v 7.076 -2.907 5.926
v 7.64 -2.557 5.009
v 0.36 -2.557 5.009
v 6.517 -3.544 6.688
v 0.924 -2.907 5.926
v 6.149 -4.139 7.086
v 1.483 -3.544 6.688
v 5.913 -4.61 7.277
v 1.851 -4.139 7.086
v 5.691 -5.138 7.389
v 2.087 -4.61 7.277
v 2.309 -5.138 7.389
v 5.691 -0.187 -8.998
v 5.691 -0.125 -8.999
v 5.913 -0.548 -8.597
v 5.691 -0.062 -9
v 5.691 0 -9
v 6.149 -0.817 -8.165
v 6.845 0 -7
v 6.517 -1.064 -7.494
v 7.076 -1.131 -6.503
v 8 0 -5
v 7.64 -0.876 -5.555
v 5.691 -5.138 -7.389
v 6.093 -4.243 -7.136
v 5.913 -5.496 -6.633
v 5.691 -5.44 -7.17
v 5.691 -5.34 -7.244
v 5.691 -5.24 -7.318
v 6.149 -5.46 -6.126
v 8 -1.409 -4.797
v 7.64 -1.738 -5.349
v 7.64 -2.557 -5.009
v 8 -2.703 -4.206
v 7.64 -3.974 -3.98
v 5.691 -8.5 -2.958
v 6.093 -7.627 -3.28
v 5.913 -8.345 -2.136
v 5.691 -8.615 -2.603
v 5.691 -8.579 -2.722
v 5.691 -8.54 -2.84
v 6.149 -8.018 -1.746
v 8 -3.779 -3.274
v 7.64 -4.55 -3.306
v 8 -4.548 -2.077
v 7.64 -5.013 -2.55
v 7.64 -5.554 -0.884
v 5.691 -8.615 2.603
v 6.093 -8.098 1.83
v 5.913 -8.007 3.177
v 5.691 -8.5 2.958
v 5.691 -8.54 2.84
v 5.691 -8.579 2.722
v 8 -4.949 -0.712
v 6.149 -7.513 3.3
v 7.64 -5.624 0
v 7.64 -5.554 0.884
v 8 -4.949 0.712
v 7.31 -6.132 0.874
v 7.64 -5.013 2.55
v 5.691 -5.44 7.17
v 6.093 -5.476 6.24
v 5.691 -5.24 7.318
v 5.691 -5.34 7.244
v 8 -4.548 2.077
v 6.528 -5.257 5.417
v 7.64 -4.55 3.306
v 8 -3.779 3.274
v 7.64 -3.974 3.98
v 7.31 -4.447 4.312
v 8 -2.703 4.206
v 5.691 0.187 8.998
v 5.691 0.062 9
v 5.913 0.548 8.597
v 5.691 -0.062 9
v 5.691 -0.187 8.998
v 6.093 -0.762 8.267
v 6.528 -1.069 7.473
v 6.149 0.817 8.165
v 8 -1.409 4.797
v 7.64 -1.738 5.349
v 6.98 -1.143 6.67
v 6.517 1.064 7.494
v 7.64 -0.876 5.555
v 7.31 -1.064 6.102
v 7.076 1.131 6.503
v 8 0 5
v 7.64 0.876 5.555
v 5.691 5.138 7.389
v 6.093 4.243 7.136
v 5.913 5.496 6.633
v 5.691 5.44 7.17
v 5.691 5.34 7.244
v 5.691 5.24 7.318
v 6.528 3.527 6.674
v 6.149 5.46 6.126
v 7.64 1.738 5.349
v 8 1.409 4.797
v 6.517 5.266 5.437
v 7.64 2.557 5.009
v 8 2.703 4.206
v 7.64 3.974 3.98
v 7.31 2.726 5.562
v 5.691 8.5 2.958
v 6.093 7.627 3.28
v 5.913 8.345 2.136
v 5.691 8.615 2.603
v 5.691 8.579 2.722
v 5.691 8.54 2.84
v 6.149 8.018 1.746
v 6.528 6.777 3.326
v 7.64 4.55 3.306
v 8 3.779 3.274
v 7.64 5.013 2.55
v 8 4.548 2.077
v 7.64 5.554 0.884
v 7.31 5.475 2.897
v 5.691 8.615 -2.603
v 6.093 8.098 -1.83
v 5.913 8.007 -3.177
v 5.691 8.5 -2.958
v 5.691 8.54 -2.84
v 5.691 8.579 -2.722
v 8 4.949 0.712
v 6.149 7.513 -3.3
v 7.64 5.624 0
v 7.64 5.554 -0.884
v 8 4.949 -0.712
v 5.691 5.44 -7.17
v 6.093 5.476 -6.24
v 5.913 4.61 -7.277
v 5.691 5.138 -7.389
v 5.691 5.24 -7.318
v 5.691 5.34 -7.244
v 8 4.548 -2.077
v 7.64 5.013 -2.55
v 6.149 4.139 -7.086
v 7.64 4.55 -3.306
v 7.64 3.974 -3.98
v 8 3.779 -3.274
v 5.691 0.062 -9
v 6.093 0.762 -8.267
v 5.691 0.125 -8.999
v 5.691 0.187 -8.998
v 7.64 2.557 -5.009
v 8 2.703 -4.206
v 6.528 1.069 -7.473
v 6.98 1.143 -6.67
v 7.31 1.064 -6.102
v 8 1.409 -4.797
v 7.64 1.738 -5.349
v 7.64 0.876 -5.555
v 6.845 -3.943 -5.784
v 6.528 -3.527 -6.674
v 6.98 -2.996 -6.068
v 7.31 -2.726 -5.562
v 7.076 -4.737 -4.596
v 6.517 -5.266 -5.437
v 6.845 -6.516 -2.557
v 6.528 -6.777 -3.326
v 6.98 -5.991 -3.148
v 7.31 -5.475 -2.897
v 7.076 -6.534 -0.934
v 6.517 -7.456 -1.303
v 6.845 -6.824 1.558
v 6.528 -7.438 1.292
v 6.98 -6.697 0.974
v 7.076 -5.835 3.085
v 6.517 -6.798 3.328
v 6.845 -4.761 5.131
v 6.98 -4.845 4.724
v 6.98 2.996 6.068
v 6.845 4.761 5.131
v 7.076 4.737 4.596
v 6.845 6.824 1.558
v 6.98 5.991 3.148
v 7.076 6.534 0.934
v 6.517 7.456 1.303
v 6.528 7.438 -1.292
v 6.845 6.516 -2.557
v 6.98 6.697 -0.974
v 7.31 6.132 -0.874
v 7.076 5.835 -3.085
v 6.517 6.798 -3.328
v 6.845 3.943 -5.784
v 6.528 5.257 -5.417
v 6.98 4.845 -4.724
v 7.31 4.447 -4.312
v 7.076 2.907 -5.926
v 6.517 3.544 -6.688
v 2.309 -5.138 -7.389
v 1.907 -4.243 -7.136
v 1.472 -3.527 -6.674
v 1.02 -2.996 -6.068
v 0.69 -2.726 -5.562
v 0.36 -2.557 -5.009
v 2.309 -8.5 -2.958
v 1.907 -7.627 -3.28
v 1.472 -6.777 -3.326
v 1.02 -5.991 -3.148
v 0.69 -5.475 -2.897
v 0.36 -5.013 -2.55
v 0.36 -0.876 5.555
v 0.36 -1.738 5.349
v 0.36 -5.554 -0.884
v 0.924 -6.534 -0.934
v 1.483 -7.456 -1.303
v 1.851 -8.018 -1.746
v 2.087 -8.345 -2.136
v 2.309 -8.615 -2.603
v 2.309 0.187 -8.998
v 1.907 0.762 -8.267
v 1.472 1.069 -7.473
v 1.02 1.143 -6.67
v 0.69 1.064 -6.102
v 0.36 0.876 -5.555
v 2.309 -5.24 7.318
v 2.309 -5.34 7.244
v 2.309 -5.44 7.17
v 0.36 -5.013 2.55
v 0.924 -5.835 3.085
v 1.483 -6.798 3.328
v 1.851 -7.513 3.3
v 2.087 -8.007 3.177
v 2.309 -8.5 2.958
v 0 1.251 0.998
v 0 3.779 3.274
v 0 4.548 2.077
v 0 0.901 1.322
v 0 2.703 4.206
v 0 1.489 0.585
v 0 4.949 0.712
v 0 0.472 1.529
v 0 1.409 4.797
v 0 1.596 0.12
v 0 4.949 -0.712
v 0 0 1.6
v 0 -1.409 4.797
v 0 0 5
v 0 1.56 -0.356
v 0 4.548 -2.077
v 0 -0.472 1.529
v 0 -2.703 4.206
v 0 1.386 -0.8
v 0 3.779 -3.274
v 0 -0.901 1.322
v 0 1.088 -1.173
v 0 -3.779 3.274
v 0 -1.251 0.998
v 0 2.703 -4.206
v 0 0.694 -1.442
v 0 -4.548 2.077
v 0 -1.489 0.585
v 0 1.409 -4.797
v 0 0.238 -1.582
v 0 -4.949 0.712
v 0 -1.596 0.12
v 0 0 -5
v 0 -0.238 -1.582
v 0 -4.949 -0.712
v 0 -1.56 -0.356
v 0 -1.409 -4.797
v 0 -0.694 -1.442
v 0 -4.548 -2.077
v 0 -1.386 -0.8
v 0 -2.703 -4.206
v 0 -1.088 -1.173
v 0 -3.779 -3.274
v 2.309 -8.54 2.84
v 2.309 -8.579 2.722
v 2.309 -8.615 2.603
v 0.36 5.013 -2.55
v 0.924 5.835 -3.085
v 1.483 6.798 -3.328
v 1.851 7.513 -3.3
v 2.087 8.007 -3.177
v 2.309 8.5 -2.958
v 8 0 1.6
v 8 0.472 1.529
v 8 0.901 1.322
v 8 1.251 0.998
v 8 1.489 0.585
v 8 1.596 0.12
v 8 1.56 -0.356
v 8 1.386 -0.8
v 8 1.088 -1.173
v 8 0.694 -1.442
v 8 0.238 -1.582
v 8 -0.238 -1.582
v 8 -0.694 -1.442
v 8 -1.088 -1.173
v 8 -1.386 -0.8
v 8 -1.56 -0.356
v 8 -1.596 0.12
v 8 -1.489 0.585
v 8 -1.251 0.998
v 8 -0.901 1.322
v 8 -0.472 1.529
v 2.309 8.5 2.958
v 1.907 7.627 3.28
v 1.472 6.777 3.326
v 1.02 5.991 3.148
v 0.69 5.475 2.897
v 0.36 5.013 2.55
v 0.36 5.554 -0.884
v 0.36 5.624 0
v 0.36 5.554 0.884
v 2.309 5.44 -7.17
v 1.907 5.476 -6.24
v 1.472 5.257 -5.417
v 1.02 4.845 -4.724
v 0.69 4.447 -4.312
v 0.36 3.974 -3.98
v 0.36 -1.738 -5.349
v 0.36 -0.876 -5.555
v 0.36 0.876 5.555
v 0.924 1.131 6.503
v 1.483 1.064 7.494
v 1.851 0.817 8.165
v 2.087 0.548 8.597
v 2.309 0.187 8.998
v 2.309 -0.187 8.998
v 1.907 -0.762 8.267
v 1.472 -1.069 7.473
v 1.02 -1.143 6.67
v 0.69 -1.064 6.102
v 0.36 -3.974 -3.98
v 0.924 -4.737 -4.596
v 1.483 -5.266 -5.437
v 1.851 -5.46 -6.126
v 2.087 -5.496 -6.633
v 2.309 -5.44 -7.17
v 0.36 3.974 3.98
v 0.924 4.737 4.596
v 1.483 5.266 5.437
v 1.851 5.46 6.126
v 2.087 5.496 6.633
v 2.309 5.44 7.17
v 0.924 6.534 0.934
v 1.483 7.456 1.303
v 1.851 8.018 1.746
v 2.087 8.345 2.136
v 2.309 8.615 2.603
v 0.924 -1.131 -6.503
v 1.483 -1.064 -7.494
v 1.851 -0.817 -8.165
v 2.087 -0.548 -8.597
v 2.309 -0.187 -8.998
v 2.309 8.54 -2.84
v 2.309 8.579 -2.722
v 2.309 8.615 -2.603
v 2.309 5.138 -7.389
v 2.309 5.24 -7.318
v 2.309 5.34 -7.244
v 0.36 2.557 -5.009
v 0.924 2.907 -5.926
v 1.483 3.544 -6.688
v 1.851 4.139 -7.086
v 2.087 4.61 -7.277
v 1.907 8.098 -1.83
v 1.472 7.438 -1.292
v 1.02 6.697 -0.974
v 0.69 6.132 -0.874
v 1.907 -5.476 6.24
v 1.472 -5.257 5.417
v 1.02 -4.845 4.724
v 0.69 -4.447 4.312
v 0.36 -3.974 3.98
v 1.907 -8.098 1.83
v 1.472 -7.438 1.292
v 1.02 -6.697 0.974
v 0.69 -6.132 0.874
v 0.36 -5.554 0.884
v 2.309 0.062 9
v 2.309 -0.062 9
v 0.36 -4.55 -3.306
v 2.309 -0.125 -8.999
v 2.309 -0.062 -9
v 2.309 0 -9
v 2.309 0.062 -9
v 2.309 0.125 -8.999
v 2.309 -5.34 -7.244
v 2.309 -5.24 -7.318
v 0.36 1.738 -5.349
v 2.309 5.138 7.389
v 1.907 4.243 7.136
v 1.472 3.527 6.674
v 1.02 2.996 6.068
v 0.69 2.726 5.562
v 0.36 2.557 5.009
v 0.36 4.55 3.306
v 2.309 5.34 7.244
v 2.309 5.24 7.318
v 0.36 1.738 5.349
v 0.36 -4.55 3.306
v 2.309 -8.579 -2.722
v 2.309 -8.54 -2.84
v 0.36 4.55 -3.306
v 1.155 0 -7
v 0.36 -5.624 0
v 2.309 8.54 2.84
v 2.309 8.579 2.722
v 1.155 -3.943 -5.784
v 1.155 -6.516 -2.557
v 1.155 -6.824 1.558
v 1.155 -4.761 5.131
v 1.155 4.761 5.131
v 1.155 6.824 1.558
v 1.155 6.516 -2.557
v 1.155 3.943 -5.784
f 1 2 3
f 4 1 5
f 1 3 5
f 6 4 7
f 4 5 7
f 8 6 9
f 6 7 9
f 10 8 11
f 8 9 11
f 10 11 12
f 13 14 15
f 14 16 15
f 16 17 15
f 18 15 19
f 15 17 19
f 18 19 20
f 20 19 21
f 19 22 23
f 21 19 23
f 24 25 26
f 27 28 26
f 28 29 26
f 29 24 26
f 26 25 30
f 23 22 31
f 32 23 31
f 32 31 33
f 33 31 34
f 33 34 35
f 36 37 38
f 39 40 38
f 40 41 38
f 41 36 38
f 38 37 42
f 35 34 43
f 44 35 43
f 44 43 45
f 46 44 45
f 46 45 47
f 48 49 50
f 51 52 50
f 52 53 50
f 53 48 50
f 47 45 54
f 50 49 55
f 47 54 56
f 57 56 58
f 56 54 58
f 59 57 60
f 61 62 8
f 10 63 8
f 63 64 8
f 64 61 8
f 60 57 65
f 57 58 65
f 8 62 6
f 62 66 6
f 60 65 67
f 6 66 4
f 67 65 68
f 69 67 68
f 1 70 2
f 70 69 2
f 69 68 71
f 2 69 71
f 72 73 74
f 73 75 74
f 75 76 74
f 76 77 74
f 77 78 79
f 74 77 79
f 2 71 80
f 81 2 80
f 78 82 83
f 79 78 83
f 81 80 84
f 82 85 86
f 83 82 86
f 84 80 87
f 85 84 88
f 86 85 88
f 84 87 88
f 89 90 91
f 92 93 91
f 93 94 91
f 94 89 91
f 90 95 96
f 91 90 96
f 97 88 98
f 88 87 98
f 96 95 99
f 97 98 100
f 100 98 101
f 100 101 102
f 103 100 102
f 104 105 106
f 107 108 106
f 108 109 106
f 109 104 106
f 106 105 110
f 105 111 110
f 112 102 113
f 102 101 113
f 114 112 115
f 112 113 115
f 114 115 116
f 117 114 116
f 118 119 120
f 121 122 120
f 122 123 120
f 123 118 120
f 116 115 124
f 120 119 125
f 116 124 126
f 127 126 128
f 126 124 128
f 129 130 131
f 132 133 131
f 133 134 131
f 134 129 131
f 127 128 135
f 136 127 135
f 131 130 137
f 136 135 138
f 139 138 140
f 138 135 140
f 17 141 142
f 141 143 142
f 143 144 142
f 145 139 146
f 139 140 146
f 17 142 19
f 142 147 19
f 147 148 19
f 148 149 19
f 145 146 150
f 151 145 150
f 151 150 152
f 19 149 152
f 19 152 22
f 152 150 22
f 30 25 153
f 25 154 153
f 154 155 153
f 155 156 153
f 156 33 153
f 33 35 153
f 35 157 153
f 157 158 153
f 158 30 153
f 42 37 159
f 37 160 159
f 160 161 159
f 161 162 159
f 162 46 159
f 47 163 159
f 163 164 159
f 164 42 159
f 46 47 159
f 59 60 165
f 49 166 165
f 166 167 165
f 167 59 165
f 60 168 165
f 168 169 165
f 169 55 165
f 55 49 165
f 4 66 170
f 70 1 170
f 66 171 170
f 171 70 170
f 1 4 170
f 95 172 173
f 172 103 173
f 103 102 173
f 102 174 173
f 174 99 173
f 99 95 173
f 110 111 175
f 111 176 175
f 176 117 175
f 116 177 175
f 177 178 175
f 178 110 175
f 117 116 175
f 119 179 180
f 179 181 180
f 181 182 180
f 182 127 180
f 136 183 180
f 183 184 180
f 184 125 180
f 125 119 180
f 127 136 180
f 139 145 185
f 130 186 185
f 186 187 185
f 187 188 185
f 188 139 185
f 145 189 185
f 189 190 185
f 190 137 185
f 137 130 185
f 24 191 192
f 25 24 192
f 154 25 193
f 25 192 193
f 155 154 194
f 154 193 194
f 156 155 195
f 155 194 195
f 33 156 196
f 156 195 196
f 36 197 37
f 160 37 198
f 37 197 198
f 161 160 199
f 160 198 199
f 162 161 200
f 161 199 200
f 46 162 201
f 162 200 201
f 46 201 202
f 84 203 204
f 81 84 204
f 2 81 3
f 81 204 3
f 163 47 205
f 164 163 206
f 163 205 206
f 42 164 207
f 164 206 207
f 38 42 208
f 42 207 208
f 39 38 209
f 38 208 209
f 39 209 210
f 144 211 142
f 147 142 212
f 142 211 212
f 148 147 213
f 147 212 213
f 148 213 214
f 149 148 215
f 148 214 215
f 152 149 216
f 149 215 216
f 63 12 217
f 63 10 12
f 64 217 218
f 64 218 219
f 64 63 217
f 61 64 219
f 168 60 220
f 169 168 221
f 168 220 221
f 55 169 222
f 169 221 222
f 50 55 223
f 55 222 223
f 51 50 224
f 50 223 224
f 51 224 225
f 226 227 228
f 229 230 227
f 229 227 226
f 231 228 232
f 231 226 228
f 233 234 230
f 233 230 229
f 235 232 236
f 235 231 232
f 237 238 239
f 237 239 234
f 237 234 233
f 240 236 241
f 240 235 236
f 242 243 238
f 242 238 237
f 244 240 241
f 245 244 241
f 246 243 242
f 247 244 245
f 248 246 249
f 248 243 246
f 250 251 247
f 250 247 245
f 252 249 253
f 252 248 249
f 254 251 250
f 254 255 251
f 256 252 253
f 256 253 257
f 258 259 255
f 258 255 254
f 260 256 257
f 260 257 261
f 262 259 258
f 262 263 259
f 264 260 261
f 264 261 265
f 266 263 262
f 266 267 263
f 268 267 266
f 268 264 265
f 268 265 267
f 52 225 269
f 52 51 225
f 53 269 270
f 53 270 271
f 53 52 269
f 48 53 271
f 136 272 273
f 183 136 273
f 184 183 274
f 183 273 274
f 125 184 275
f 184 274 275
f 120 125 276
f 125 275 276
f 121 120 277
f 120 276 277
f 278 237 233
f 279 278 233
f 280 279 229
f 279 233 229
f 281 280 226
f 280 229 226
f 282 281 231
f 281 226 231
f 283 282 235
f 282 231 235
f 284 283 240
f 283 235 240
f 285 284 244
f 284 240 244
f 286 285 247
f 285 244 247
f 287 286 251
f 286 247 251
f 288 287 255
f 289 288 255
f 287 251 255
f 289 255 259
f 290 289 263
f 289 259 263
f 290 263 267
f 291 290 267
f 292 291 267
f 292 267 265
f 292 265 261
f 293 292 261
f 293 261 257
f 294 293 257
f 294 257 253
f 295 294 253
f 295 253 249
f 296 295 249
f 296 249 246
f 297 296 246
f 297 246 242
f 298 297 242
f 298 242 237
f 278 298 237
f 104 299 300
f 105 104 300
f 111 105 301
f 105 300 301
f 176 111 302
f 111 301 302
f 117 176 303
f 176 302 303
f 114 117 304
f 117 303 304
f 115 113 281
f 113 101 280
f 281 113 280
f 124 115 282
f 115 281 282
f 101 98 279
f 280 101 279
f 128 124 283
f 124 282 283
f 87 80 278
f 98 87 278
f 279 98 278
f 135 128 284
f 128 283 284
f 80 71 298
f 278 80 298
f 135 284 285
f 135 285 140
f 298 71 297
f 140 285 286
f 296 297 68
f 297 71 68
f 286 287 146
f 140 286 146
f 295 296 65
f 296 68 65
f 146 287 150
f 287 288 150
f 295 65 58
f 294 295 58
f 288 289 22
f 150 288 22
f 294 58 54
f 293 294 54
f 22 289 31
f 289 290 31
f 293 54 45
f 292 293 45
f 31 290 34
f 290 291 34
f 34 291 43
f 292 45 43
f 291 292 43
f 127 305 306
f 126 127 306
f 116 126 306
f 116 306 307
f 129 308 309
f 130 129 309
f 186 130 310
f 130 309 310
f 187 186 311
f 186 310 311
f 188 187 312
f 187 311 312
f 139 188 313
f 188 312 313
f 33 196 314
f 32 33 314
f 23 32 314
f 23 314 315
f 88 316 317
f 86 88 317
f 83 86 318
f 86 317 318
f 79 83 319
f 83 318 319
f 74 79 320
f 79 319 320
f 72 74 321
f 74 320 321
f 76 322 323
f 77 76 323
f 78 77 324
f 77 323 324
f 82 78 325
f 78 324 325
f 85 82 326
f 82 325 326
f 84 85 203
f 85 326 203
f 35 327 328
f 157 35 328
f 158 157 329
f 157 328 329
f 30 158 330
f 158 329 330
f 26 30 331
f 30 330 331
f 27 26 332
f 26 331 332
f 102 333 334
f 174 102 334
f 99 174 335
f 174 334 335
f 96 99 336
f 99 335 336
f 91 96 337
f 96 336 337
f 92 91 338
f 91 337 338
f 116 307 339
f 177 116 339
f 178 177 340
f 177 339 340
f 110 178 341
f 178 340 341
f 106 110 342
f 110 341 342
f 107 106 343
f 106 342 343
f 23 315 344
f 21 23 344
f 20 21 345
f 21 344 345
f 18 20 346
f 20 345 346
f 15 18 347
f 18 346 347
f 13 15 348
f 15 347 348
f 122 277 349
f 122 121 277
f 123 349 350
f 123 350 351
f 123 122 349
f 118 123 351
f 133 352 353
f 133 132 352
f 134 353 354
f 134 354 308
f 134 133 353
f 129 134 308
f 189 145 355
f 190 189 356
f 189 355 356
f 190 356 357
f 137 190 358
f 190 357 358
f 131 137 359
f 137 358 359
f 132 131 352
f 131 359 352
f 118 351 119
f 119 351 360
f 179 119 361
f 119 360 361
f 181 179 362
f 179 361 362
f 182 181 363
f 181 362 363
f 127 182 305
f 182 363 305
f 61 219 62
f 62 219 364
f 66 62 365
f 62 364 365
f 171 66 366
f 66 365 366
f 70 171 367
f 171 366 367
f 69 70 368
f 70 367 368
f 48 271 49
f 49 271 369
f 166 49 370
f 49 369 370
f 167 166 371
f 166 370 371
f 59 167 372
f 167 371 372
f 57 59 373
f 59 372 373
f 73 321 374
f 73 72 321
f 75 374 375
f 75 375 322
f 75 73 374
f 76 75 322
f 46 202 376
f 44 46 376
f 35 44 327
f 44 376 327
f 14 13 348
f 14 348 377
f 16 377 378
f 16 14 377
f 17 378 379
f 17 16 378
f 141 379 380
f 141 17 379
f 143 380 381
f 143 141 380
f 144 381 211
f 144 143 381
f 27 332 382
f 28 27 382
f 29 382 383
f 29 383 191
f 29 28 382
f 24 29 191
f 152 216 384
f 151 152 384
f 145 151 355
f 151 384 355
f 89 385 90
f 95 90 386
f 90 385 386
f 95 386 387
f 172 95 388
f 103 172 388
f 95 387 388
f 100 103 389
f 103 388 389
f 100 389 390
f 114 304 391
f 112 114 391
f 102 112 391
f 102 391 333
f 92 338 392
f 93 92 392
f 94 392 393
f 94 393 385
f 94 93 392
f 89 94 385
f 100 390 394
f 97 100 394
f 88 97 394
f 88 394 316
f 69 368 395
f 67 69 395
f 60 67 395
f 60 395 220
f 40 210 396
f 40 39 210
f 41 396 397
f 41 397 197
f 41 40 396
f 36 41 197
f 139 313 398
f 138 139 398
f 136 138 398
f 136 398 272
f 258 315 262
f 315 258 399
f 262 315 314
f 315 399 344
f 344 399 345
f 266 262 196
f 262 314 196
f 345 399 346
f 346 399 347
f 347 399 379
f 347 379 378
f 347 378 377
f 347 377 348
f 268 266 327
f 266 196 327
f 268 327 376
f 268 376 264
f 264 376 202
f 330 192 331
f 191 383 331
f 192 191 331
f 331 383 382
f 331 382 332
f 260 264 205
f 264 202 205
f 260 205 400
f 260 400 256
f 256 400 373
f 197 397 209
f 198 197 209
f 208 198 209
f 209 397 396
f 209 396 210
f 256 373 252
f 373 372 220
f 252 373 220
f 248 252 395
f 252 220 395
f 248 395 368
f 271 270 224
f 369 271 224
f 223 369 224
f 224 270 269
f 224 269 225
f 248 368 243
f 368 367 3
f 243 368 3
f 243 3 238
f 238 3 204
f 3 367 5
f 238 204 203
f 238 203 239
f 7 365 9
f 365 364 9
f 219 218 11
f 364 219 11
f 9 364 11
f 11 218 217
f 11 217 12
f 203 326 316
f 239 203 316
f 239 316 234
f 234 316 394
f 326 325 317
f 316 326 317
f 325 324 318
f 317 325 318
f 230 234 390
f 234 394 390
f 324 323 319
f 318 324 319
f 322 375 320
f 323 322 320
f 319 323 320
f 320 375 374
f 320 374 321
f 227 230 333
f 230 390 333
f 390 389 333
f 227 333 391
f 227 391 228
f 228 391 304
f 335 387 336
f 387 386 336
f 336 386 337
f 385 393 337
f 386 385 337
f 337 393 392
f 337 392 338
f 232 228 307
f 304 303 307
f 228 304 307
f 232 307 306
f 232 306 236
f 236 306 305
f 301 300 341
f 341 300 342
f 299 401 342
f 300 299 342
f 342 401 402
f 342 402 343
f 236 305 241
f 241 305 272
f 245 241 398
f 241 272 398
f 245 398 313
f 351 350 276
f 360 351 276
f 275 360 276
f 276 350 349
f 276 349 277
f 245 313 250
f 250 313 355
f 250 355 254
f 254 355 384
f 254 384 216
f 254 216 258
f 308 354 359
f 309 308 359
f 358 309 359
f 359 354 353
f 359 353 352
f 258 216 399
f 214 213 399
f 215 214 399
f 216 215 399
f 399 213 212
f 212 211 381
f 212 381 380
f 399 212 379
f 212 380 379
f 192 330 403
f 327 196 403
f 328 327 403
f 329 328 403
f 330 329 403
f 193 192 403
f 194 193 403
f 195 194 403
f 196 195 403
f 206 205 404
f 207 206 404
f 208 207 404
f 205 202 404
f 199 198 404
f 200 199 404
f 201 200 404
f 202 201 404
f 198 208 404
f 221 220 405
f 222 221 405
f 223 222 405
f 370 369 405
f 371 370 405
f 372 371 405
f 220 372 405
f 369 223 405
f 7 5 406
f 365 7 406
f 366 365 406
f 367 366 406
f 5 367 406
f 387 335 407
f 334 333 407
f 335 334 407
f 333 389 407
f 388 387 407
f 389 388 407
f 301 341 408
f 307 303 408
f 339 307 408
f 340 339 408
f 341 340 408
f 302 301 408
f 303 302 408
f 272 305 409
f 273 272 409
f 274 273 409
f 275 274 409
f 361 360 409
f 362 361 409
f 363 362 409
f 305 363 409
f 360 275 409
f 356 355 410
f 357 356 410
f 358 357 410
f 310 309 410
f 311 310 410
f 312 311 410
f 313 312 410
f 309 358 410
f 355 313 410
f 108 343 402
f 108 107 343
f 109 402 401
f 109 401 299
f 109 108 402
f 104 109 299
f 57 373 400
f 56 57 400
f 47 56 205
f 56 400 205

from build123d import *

# Parameters (mm, degrees)
BASPROSKE_W        = 8
BASPROSKE_H        = 9
TOOTHCUT_DEPTH     = 16.033296378
TEETHCUTS_COUNT    = 10
TEETHCUTS_ANGLE    = 324
BORSKE_R           = 1.5
BORE_DEPTH         = 50.0000508
SKETCH2_R          = 1.6
CUT_EXTRUDE1_DEPTH = 10


with BuildPart() as part:
    # BasProSke → Base-Revolve (revolve)
    with BuildSketch(Plane(origin=(0, 0, 0), x_dir=(1, 0, 0), z_dir=(0, 1, 0)), mode=Mode.PRIVATE) as base_revolve_sk:
        with Locations((4, 4.5)):
            Rectangle(BASPROSKE_W, BASPROSKE_H)
    revolve(base_revolve_sk.sketch.rotate(Axis((-10, 0, 0), (1, 0, 0)), 180), axis=Axis((-10, 0, 0), (1, 0, 0)))

    # TooCutSke → ToothCut (cut, through all)
    with BuildSketch(Plane(origin=(0, 0, 0), x_dir=(0, 0, -1), z_dir=(1, 0, 0))):
        with BuildLine():
            ThreePointArc((0.883878355, 5.554109745), (0, 5.624), (-0.883878355, 5.554109745))
            ThreePointArc((-0.883878355, 5.554109745), (-1.258245767, 7.379188248), (-2.637816971, 8.631324741))
            ThreePointArc((-2.637816971, 8.631324741), (0, 9.0254), (2.637816971, 8.631324741))
            ThreePointArc((2.637816971, 8.631324741), (1.258245767, 7.379188248), (0.883878355, 5.554109745))
        make_face()
    toothcut = extrude(amount=TOOTHCUT_DEPTH, mode=Mode.SUBTRACT)

    # TeethCuts: ToothCut ×10 about axis
    teethcuts_axis = Axis((-10, 0, 0), (1, 0, 0))
    for i in range(1, TEETHCUTS_COUNT):
        add(toothcut.rotate(teethcuts_axis, i * TEETHCUTS_ANGLE / (TEETHCUTS_COUNT - 1)), mode=Mode.SUBTRACT)

    # BorSke → Bore (cut, symmetric)
    with BuildSketch(Plane(origin=(0, 0, 0), x_dir=(0, 0, -1), z_dir=(1, 0, 0))):
        with Locations(Location((0, 0, 0), (0, 0, 180))):
            Circle(BORSKE_R)
    extrude(amount=BORE_DEPTH, both=True, mode=Mode.SUBTRACT)

    # Sketch1 → Cut-Revolve1 (revolve, cut)
    with BuildSketch(Plane(origin=(0, 0, 0), x_dir=(1, 0, 0), z_dir=(0, 1, 0)), mode=Mode.PRIVATE) as cut_revolve1_sk:
        Polygon((0, -5), (3.946553979, -11.835632006), (4.053446021, -11.835632006), (8, -5), (10.092806182, -15.908435196), (-2.21285392, -14.524958616), align=None)
    revolve(cut_revolve1_sk.sketch.rotate(Axis((0, 0, 0), (-1, 0, 0)), 180), axis=Axis((0, 0, 0), (-1, 0, 0)), mode=Mode.SUBTRACT)

    # Sketch2 → Cut-Extrude1 (cut)
    with BuildSketch(Plane.ZY):
        Circle(SKETCH2_R)
    extrude(amount=-CUT_EXTRUDE1_DEPTH, mode=Mode.SUBTRACT)


solid = part.part
